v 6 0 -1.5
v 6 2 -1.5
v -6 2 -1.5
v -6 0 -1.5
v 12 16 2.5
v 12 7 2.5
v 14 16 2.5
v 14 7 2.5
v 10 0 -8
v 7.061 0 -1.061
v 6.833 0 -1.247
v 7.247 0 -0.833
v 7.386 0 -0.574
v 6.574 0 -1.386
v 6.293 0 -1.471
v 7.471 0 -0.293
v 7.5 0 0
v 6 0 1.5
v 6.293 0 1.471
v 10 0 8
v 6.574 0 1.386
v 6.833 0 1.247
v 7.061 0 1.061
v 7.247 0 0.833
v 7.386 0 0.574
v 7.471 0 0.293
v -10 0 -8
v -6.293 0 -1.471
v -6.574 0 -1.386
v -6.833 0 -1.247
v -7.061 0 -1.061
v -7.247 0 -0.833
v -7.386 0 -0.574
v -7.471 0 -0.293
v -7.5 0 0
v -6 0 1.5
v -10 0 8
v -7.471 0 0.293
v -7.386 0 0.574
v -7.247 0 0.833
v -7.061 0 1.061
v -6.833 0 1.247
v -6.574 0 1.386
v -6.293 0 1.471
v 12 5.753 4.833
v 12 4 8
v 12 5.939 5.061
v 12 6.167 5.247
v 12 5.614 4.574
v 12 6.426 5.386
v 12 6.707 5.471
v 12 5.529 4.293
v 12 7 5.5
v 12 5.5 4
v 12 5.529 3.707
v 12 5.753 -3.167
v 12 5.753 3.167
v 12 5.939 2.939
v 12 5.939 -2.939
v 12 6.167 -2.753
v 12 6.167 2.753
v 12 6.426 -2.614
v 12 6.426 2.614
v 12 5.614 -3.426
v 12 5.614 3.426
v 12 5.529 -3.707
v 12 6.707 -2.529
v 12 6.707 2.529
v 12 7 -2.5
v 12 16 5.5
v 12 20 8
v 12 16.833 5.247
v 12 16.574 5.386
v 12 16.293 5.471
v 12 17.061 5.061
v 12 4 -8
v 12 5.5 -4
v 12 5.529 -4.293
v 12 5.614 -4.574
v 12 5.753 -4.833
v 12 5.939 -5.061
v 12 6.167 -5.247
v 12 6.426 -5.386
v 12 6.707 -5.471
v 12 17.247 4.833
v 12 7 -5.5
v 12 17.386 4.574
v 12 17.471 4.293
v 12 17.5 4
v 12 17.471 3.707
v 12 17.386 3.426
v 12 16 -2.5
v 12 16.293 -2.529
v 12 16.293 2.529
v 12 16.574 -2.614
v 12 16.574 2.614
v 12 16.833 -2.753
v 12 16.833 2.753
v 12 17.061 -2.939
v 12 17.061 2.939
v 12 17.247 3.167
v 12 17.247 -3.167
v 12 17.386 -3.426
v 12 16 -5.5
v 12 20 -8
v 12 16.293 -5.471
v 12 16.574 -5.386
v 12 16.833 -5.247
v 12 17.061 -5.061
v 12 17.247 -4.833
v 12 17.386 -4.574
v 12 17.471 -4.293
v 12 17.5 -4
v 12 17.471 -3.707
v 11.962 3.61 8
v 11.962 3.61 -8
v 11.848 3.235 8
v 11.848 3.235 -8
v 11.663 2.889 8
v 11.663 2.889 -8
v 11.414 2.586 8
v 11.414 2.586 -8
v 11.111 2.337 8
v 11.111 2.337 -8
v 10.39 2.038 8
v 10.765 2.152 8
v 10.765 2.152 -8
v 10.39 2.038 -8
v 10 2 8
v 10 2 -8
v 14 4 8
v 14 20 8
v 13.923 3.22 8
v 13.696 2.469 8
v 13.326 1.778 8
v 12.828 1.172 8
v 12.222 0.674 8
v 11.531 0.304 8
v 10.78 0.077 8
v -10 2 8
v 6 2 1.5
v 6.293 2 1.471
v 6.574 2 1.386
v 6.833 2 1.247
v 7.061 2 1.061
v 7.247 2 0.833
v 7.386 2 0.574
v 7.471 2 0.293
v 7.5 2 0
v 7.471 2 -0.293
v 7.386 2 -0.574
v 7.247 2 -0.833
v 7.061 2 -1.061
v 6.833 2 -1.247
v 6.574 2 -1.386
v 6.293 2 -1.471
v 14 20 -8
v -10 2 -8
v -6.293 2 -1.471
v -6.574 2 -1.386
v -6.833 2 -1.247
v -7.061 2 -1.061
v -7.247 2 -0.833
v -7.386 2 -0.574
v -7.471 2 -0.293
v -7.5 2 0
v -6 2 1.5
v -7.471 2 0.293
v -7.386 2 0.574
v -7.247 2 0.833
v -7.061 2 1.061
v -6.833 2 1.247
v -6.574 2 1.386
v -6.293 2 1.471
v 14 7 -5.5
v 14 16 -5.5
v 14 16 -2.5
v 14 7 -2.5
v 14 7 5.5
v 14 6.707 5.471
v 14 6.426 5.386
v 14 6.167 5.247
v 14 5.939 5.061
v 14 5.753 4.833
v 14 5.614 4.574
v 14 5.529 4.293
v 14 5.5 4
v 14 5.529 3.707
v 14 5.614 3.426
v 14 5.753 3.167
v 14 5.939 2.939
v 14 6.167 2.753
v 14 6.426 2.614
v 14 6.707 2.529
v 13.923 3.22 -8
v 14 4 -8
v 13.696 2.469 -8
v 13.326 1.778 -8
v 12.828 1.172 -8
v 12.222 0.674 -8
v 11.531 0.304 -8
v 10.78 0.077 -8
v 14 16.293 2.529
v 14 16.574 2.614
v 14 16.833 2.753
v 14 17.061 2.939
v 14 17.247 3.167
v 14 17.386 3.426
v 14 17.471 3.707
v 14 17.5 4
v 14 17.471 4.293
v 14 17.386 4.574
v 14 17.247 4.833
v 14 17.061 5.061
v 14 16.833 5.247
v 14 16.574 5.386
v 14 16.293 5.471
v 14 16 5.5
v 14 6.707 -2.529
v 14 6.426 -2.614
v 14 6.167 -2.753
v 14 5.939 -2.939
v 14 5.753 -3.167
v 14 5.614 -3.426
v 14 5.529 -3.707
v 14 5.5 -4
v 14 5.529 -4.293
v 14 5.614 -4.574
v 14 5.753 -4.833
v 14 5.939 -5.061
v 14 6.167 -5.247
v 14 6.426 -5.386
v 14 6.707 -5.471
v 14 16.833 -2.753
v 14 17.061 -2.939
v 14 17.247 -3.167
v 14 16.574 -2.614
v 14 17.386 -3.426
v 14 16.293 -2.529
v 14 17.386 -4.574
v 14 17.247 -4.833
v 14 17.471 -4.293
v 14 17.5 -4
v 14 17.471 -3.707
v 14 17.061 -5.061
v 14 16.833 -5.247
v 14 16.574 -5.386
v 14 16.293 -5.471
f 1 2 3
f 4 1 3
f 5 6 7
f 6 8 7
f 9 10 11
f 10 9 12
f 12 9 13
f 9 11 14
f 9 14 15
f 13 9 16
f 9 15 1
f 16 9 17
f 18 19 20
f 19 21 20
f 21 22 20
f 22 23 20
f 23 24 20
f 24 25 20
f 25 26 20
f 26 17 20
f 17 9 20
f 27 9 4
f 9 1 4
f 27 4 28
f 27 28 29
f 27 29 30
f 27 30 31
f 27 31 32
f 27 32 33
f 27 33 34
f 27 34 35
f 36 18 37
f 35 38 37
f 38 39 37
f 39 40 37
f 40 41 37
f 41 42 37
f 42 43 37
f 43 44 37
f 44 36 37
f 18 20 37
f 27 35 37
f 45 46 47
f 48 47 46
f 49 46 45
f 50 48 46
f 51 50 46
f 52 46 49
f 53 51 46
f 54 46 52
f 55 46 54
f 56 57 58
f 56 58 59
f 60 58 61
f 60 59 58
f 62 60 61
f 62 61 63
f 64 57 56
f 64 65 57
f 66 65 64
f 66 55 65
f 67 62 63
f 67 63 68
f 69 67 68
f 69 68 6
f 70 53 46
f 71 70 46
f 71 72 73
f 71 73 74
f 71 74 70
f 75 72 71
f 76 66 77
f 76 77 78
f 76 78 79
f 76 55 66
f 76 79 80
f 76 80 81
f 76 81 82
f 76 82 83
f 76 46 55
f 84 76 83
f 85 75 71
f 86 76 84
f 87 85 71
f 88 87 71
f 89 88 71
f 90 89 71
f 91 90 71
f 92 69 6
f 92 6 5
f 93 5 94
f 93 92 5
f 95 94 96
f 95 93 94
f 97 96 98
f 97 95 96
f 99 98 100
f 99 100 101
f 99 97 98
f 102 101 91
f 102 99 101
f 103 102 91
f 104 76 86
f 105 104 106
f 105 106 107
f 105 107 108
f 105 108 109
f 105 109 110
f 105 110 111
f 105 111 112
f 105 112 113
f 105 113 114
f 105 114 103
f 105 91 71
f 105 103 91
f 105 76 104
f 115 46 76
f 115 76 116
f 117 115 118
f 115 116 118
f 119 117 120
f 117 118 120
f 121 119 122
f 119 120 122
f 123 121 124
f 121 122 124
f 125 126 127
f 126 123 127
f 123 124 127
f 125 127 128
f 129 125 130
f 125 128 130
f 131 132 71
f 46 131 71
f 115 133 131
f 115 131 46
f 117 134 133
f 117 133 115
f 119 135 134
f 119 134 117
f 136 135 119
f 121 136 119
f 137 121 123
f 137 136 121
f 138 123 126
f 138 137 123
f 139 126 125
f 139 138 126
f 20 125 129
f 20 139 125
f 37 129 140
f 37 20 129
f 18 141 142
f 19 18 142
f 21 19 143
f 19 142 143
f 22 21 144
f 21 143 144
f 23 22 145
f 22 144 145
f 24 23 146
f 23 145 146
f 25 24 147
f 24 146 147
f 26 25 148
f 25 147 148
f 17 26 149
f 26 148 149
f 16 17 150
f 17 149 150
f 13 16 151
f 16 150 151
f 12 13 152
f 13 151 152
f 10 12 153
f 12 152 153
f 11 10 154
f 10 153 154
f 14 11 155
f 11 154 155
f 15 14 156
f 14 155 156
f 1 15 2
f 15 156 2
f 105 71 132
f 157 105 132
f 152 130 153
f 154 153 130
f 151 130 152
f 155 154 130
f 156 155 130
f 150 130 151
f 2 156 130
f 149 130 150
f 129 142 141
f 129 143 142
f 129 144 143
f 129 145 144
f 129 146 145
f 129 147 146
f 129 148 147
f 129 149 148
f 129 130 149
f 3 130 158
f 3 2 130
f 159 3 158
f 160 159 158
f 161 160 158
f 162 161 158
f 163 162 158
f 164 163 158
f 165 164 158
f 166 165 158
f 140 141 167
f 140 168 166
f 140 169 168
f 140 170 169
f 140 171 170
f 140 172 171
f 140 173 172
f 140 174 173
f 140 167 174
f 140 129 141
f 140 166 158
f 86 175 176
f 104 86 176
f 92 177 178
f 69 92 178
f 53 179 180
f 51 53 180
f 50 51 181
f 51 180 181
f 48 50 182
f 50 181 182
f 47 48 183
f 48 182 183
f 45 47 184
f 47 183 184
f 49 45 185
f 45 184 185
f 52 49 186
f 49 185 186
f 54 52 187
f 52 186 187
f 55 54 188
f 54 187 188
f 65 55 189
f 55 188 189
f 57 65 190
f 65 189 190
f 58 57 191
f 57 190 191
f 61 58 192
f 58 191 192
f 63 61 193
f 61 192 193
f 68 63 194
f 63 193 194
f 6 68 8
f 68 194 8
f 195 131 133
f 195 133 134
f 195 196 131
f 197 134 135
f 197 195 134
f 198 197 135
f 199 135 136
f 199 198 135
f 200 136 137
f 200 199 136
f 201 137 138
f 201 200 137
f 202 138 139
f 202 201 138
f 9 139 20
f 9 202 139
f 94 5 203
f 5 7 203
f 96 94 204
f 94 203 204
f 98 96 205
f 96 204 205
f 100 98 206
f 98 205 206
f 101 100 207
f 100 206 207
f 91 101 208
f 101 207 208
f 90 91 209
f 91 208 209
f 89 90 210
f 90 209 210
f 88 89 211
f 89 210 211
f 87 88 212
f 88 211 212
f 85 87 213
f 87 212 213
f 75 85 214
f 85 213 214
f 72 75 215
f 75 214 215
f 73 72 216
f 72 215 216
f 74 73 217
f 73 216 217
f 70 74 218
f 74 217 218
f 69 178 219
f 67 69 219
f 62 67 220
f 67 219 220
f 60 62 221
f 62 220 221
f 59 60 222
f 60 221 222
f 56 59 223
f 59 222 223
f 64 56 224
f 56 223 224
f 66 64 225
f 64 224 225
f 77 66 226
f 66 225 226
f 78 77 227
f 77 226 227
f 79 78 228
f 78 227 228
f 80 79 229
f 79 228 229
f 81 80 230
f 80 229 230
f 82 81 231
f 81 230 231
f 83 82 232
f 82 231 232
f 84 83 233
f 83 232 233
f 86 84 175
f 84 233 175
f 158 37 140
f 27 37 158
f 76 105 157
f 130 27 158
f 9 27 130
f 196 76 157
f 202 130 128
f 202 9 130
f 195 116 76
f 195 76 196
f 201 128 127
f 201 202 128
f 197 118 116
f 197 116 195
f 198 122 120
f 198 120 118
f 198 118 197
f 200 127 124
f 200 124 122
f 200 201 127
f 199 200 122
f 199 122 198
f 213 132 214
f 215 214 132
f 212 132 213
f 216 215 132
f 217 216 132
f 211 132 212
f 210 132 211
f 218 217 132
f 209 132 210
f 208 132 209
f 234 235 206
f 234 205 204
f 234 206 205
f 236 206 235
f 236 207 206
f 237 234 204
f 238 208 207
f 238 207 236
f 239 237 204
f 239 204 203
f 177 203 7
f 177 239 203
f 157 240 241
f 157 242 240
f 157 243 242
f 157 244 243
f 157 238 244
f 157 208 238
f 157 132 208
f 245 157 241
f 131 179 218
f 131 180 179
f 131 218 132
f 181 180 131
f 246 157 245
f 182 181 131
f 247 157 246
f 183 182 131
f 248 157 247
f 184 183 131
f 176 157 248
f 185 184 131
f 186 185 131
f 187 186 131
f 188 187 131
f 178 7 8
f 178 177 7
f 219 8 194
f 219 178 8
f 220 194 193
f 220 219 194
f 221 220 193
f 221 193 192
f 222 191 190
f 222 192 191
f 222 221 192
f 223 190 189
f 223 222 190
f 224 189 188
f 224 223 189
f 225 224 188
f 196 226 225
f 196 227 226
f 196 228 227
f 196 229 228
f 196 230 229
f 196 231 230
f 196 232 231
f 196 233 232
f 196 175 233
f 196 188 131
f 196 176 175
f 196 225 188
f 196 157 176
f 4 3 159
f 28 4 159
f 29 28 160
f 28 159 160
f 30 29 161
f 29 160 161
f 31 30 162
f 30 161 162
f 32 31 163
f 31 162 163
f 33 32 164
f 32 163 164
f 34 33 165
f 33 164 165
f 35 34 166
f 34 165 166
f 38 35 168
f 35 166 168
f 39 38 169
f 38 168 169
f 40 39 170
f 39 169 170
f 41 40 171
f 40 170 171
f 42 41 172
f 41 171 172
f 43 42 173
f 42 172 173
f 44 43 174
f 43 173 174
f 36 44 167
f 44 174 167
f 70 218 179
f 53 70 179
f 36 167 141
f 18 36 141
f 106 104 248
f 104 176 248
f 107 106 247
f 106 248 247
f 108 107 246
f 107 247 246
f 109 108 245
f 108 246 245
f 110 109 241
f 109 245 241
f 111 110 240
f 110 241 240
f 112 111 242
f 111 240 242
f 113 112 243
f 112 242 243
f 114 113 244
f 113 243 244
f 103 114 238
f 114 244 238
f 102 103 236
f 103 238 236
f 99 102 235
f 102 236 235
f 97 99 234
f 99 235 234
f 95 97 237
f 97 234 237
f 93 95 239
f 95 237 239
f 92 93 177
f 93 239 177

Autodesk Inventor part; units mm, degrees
ref_plane "YZ Plane" through (0, 0, 0) normal (1, 0, 0) x (0, 1, 0)
ref_plane "XZ Plane" through (0, 0, 0) normal (0, 1, 0) x (-1, 0, 0)
ref_plane "XY Plane" through (0, 0, 0) normal (0, 0, 1) x (1, 0, 0)
sketch "スケッチ1" plane through (0, 0, 0) normal (0, 1, 0) x (-1, 0, 0)
  line L0 (-10, 8) -> (10, 8)
  line L1 (10, 8) -> (10, -8)
  line L2 (10, -8) -> (-10, -8)
  line L3 (-10, -8) -> (-10, 8)
  line L4 (-10, 8) -> (10, -8) construction
  line L5 (10, 8) -> (-10, -8) construction
  point P0 (0, 0)
  dimension "d0" = 20
  dimension "d1" = 16
extrude "プレート1" add sketch "スケッチ1" along normal blind 2
sketch "スケッチ2" plane through (12, 4, -8) normal (1, 0, 0) x (0, 1, 0)
  line L0 (0, 16) -> (0, 0)
  line L1 (0, 0) -> (16, 0)
  line L2 (16, 0) -> (16, 16)
  line L3 (16, 16) -> (0, 16)
edge flange "フランジ1" height 20 angle 90 thickness 2 bend radius 2 thickness toward (1, 0, 0) relief tear relief width 2 relief depth 1 edges at (10, 2, 0) wall of the first edge with corners at (12, 4, 8) (12, 4, -8) (12, 20, -8) (12, 20, 8)
bend "曲げ1"
corner "コーナー1"
sketch "スケッチ3" plane through (14, 20, 8) normal (1, 0, 0) x (0, 0, -1)
  line L0 (2.5, -4) -> (2.5, -13)
  arc A0 (2.5, -13) -> (5.5, -13) centre (4, -13) ccw
  line L1 (5.5, -13) -> (5.5, -4)
  arc A1 (5.5, -4) -> (2.5, -4) centre (4, -4) ccw
  line L2 (10.5, -4) -> (10.5, -13)
  arc A2 (10.5, -13) -> (13.5, -13) centre (12, -13) ccw
  line L3 (13.5, -13) -> (13.5, -4)
  arc A3 (13.5, -4) -> (10.5, -4) centre (12, -4) ccw
  line L4 (0, -16) -> (0, 0) projected
  line L5 (16, 0) -> (16, -16) projected
  line L6 (0, 0) -> (16, 0) projected
  line L7 (0, -16) -> (16, -16) projected
  point P0 (8, -20)
  dimension "d13" = 4
  dimension "d14" = 4
  dimension "d17" = 3
  dimension "d18" = 4
  dimension "d19" = 1.5
  dimension "d20" = 1.5
extrude "押し出し1" cut sketch "スケッチ3" against normal blind 10 contours A1 L1 A0 L0 | A3 L3 A2 L2
sketch "スケッチ4" plane through (0, 2, 0) normal (0, 1, 0) x (1, 0, 0)
  line L0 (-6, -1.5) -> (6, -1.5)
  arc A0 (6, -1.5) -> (6, 1.5) centre (6, 0) ccw
  line L1 (6, 1.5) -> (-6, 1.5)
  arc A1 (-6, 1.5) -> (-6, -1.5) centre (-6, 0) ccw
  line L2 (-10, -8) -> (-10, 8) projected
  line L3 (10, 8) -> (10, -8) projected
  point P0 (0, 0)
  dimension "d23" = 4
  dimension "d24" = 4
  dimension "d25" = 1.5
extrude "押し出し2" cut sketch "スケッチ4" against normal blind 10
equation "\"d2\" = Thickness"
equation "\"d3\" = BendReliefWidth"
equation "\"d4\" = BendReliefDepth"
equation "\"d5\" = MinimumRemnant"
equation "\"d6\" = TransitionRadius"
equation "\"d9\" = BendRadius"
equation "\"d10\" = CornerReliefSize"
equation "\"d11\" = GapSize"
equation "\"d12\" = JacobiRadiusSize"
equation "\"BendRadius\" = Thickness"
equation "\"BendReliefWidth\" = Thickness"
equation "\"BendReliefDepth\" = 0.5 * Thickness"
equation "\"CornerReliefSize\" = 4 * Thickness"
equation "\"MinimumRemnant\" = 2 * Thickness"
equation "\"TransitionRadius\" = BendRadius"
equation "\"JacobiRadiusSize\" = BendRadius"
equation "\"GapSize\" = Thickness"
equation "\"Thickness\" = 2"
properties part number "keyL_medium" material "アルミニウム 6061"
